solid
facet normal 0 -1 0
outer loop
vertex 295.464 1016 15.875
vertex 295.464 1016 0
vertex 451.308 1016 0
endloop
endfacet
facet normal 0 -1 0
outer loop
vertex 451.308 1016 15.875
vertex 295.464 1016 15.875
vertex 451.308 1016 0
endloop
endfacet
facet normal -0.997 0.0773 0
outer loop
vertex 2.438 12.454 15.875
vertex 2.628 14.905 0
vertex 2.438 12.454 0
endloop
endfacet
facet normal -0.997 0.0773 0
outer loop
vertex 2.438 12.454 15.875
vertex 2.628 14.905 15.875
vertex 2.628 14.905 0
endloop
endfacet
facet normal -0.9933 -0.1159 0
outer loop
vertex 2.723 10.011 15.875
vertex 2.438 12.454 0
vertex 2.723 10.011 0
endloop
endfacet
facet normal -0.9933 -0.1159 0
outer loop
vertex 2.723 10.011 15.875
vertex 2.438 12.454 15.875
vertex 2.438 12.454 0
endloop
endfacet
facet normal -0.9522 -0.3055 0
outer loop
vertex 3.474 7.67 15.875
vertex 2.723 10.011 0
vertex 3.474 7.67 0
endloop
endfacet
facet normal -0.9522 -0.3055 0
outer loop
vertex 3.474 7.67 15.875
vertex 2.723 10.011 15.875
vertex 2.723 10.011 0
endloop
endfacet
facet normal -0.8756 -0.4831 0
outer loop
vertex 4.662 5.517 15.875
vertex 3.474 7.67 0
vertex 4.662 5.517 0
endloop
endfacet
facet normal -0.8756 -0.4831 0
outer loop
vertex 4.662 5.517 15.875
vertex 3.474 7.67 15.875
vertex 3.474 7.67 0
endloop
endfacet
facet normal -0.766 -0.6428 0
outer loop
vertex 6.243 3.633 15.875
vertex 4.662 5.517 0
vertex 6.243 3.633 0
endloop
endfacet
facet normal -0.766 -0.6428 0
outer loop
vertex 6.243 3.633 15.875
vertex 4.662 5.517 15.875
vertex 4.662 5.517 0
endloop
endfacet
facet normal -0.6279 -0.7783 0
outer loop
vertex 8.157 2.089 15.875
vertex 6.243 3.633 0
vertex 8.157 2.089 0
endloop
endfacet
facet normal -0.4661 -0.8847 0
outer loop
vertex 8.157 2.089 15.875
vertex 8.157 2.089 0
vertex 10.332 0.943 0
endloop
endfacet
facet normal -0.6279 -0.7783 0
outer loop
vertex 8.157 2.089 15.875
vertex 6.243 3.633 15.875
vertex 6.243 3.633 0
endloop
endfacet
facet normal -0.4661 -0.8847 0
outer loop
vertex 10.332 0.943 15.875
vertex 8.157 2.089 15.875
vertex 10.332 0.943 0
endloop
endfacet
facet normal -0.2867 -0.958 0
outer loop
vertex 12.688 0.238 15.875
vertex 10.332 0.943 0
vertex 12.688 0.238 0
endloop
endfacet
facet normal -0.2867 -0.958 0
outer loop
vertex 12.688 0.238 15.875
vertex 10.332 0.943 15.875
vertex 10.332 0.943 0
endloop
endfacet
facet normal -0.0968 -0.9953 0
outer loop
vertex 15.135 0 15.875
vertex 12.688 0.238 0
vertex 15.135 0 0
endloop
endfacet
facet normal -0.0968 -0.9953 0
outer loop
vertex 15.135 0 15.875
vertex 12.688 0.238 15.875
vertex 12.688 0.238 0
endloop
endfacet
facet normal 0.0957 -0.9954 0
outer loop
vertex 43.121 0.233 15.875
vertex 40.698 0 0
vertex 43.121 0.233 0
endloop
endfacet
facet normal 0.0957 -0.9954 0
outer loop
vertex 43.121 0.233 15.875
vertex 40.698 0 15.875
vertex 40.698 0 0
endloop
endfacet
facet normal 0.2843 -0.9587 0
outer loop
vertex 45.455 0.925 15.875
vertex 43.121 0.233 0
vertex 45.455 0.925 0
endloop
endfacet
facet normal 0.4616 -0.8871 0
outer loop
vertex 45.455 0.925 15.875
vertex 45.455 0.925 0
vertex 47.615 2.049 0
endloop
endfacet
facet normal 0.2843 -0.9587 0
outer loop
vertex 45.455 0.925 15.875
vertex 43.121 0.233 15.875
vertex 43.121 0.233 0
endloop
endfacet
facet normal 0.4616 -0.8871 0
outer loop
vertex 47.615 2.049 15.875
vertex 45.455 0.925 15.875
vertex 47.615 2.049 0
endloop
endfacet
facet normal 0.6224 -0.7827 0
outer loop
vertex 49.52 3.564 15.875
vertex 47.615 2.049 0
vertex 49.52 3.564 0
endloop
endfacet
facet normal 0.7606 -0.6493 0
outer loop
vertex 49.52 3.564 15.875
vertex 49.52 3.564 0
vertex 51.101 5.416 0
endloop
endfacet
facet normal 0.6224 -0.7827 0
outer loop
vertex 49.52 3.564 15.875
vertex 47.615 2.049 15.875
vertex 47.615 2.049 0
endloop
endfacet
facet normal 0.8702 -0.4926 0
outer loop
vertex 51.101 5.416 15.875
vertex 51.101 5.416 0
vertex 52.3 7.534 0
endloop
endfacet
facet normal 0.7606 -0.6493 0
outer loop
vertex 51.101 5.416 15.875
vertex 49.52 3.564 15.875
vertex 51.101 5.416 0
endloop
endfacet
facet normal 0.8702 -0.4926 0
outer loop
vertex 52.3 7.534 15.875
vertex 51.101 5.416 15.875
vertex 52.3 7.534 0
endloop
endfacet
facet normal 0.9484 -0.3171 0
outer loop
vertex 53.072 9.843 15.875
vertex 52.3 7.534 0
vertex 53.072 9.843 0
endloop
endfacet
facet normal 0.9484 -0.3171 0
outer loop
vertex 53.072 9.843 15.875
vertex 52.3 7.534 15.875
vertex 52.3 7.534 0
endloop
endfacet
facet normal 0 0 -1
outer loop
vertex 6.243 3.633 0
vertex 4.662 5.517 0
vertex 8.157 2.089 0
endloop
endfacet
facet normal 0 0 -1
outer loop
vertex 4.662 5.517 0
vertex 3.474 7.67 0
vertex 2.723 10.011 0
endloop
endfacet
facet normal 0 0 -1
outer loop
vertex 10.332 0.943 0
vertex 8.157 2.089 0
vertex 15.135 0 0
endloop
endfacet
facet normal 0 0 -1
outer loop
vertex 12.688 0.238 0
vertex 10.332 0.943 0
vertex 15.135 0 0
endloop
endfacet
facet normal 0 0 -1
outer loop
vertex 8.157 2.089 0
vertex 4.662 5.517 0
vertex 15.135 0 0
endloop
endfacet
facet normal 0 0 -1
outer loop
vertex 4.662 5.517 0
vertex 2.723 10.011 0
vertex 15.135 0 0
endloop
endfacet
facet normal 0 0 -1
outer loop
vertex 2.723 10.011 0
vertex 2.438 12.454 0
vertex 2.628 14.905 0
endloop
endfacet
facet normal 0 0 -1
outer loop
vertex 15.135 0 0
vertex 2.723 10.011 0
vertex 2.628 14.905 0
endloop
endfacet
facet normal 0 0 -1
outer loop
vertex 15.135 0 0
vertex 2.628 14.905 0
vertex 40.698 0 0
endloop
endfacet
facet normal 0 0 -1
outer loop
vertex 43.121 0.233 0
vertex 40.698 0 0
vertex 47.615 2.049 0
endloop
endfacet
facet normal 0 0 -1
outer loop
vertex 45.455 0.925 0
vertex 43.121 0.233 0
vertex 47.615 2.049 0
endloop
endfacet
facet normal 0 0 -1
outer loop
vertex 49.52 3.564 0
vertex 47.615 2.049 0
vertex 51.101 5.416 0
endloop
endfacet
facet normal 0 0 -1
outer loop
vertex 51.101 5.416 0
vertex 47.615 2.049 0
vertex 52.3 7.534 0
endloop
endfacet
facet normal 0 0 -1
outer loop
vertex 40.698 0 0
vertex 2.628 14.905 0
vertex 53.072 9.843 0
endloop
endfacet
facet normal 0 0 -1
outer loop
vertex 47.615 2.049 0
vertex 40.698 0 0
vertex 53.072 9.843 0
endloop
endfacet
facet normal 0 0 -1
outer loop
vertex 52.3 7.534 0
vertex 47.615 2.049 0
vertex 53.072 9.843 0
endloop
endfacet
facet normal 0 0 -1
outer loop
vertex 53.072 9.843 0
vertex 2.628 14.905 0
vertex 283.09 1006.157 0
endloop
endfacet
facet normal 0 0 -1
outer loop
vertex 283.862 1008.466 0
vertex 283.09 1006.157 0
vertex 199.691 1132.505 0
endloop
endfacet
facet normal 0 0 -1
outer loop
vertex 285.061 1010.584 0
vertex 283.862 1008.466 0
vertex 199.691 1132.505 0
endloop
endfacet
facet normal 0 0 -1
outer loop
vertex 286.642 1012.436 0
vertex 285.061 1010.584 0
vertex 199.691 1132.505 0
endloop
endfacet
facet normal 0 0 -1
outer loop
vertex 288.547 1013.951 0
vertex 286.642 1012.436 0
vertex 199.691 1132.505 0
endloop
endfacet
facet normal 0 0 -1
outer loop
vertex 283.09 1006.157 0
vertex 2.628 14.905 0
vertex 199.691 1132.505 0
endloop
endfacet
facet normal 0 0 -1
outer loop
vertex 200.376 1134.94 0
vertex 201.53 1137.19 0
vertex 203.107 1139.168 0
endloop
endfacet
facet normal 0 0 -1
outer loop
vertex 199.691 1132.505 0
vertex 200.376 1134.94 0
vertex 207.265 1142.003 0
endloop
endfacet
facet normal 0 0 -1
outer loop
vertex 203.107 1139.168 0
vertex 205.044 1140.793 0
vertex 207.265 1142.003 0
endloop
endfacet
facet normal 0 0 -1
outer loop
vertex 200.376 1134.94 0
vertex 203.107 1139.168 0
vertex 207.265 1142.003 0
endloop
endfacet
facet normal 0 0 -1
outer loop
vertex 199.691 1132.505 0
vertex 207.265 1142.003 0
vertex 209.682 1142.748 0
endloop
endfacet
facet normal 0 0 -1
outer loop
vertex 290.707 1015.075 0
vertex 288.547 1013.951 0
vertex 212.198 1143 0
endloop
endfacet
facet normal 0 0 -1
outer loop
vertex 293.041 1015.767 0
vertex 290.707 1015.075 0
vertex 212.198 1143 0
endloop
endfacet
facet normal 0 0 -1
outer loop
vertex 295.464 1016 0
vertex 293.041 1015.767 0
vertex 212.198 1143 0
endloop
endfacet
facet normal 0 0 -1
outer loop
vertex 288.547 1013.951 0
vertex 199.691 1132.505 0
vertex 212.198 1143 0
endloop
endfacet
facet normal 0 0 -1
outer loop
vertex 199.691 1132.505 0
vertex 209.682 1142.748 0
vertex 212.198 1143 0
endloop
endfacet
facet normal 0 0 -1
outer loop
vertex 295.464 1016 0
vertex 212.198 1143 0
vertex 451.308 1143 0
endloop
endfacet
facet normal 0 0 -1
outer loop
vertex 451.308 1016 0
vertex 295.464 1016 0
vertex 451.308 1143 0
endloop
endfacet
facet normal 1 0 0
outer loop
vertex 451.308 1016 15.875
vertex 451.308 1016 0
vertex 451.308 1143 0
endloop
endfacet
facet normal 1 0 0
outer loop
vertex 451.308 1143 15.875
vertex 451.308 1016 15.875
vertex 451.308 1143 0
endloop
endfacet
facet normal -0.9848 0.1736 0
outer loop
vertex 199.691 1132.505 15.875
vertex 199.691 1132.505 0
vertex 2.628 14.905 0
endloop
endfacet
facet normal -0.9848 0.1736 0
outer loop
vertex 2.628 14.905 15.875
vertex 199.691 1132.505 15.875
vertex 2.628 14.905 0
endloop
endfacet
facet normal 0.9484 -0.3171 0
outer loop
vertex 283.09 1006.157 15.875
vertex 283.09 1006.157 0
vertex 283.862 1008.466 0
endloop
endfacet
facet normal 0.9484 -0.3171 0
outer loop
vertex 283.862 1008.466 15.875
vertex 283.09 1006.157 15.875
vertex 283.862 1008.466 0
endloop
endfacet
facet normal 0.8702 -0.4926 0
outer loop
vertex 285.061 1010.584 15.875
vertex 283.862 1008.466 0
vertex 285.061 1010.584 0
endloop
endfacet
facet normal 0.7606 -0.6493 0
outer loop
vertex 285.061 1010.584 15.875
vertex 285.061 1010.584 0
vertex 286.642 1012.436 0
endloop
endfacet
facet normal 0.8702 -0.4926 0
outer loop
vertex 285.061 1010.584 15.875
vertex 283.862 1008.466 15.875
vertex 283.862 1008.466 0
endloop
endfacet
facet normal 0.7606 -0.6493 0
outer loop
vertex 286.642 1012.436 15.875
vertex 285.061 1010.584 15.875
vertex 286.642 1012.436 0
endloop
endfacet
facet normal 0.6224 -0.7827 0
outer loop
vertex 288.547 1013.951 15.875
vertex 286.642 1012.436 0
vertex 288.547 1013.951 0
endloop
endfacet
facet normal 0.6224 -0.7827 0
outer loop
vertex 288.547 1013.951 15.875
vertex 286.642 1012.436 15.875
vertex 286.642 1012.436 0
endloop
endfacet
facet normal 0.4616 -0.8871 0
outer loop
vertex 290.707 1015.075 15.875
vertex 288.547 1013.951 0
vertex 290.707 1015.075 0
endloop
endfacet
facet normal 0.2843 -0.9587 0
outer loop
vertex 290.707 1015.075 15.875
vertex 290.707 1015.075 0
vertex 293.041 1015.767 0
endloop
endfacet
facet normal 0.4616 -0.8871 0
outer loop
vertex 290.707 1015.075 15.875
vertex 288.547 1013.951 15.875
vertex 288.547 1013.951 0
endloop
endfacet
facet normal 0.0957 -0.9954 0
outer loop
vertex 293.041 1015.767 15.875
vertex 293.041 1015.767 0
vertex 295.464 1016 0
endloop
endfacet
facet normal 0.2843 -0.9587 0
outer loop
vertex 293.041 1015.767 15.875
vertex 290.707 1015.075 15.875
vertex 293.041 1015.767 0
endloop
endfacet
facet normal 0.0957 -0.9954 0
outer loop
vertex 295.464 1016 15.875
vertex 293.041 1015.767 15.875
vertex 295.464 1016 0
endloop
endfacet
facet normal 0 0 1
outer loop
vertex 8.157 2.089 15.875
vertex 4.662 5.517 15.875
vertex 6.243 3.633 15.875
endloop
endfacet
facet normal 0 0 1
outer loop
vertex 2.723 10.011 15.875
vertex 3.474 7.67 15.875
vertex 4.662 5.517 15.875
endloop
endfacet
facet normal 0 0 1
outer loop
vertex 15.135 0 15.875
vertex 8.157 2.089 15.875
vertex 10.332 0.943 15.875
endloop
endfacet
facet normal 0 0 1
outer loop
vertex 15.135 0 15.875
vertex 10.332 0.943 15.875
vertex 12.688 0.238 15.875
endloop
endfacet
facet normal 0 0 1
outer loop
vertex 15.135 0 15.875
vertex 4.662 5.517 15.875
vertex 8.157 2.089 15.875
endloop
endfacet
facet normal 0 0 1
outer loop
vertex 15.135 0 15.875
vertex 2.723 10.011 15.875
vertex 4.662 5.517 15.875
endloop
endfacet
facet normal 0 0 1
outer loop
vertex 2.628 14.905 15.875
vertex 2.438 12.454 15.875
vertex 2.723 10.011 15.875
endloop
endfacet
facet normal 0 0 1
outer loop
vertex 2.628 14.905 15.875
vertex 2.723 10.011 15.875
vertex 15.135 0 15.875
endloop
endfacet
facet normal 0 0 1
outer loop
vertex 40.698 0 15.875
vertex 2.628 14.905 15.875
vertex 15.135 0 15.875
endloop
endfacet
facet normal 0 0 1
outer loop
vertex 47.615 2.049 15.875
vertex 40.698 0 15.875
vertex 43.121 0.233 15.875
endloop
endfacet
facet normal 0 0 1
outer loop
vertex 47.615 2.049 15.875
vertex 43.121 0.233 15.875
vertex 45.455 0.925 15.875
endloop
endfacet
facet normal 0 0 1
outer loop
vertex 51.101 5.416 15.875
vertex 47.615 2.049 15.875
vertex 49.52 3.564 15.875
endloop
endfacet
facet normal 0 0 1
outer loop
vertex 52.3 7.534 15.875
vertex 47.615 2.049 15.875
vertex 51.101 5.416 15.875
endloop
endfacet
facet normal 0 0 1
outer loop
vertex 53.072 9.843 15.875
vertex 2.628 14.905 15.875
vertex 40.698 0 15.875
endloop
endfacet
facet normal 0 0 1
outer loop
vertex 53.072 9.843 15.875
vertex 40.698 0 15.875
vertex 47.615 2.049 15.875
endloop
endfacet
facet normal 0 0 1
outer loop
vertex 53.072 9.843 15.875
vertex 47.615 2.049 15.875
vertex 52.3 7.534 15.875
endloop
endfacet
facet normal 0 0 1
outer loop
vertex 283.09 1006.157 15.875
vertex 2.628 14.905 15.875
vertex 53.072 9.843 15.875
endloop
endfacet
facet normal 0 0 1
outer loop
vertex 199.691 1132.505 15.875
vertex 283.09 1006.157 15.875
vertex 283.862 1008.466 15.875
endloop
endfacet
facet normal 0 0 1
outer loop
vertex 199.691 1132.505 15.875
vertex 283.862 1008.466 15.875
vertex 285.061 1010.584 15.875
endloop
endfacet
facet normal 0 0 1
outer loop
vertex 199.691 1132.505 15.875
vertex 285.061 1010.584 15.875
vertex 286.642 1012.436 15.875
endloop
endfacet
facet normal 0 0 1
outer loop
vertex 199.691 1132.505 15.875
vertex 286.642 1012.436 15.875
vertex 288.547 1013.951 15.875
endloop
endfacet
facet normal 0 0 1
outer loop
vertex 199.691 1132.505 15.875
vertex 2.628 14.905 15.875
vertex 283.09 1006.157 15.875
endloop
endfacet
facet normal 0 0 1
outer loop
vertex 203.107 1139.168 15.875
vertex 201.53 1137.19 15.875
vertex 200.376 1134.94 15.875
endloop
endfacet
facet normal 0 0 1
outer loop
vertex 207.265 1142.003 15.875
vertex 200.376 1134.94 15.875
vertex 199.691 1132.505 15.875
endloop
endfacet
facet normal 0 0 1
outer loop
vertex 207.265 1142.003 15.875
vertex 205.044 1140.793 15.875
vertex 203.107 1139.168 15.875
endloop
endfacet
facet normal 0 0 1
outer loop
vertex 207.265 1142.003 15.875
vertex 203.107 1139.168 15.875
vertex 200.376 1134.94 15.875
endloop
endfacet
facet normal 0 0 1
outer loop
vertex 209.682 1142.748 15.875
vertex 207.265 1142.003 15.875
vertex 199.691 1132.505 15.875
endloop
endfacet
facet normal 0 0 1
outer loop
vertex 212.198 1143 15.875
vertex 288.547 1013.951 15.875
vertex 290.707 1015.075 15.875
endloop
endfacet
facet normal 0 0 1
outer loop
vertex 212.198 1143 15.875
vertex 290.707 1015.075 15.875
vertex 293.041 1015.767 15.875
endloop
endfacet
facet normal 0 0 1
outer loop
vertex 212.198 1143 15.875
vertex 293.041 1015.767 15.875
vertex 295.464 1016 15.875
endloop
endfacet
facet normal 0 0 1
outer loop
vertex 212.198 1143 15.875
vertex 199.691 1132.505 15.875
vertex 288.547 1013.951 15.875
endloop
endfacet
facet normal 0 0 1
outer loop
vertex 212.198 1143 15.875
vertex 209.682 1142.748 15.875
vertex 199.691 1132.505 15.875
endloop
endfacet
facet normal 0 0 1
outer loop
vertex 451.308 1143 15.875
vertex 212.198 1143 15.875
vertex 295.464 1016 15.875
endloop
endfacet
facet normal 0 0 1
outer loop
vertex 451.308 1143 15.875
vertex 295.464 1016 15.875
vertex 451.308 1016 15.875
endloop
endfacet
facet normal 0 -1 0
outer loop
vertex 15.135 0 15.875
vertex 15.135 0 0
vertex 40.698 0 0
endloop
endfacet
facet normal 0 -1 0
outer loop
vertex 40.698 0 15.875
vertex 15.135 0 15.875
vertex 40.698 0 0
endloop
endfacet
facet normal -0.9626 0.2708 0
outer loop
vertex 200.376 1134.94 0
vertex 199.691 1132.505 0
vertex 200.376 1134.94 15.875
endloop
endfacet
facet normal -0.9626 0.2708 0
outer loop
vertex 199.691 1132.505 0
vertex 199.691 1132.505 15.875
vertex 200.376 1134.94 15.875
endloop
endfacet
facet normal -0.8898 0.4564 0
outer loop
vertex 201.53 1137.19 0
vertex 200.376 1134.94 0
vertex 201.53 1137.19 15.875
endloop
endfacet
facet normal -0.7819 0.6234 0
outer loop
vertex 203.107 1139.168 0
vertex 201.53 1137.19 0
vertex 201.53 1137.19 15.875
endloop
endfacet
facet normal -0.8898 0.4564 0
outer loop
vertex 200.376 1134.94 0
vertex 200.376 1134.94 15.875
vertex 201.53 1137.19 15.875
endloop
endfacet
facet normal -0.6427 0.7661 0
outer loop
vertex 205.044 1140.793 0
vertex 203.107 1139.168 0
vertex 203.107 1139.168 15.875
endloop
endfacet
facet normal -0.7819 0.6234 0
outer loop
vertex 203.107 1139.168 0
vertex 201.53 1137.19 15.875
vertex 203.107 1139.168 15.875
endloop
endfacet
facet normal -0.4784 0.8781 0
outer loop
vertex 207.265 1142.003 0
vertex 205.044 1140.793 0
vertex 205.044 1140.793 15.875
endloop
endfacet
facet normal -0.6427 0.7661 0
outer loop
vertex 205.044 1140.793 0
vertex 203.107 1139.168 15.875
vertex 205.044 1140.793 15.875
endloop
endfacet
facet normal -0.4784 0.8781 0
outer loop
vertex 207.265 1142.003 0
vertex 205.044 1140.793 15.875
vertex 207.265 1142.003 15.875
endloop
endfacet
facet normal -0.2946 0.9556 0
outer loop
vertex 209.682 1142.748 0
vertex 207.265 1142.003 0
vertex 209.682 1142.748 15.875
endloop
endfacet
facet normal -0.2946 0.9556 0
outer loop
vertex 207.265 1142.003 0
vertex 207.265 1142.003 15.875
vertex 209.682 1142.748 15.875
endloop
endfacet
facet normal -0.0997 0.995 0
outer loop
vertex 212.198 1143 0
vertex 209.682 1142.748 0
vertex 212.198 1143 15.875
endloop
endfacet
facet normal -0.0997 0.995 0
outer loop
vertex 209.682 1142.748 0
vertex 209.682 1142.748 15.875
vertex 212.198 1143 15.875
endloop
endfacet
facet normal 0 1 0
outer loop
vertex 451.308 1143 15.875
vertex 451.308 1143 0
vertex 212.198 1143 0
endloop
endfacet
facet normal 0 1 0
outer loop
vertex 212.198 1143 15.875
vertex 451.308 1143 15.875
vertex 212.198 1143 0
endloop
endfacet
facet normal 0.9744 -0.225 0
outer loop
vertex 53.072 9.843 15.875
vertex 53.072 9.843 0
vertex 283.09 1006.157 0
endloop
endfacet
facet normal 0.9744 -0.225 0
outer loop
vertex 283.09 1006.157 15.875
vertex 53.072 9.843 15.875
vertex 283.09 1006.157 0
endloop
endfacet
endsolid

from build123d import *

# Parameters (mm, degrees)
F1_DEPTH = 15.875
F2_R     = 12.7


# Not quite as in the source:
# - a length typed as a fraction of an inch, garbled in the dataset ("3 / 203.2 mm" for 3/8 in), is restored


with BuildPart() as f1:
    # F0 (on Top) → F1 (new body)
    with BuildSketch(Plane.XY):
        Polygon((201.5417389498, 1143), (0, 0), (50.8, 0), (285.3620821836, 1016), (451.3084056164, 1016), (451.3084056164, 1143), align=None)
    extrude(amount=F1_DEPTH)

    # F2
    f2_edges = [f1.edges().sort_by_distance(p)[0] for p in [
        (201.541739, 1143, 7.9375),
        (285.362082, 1016, 7.9375),
        (0, 0, 7.9375),
        (50.8, 0, 7.9375),
    ]]
    fillet(f2_edges, radius=F2_R)


solid = f1.part
